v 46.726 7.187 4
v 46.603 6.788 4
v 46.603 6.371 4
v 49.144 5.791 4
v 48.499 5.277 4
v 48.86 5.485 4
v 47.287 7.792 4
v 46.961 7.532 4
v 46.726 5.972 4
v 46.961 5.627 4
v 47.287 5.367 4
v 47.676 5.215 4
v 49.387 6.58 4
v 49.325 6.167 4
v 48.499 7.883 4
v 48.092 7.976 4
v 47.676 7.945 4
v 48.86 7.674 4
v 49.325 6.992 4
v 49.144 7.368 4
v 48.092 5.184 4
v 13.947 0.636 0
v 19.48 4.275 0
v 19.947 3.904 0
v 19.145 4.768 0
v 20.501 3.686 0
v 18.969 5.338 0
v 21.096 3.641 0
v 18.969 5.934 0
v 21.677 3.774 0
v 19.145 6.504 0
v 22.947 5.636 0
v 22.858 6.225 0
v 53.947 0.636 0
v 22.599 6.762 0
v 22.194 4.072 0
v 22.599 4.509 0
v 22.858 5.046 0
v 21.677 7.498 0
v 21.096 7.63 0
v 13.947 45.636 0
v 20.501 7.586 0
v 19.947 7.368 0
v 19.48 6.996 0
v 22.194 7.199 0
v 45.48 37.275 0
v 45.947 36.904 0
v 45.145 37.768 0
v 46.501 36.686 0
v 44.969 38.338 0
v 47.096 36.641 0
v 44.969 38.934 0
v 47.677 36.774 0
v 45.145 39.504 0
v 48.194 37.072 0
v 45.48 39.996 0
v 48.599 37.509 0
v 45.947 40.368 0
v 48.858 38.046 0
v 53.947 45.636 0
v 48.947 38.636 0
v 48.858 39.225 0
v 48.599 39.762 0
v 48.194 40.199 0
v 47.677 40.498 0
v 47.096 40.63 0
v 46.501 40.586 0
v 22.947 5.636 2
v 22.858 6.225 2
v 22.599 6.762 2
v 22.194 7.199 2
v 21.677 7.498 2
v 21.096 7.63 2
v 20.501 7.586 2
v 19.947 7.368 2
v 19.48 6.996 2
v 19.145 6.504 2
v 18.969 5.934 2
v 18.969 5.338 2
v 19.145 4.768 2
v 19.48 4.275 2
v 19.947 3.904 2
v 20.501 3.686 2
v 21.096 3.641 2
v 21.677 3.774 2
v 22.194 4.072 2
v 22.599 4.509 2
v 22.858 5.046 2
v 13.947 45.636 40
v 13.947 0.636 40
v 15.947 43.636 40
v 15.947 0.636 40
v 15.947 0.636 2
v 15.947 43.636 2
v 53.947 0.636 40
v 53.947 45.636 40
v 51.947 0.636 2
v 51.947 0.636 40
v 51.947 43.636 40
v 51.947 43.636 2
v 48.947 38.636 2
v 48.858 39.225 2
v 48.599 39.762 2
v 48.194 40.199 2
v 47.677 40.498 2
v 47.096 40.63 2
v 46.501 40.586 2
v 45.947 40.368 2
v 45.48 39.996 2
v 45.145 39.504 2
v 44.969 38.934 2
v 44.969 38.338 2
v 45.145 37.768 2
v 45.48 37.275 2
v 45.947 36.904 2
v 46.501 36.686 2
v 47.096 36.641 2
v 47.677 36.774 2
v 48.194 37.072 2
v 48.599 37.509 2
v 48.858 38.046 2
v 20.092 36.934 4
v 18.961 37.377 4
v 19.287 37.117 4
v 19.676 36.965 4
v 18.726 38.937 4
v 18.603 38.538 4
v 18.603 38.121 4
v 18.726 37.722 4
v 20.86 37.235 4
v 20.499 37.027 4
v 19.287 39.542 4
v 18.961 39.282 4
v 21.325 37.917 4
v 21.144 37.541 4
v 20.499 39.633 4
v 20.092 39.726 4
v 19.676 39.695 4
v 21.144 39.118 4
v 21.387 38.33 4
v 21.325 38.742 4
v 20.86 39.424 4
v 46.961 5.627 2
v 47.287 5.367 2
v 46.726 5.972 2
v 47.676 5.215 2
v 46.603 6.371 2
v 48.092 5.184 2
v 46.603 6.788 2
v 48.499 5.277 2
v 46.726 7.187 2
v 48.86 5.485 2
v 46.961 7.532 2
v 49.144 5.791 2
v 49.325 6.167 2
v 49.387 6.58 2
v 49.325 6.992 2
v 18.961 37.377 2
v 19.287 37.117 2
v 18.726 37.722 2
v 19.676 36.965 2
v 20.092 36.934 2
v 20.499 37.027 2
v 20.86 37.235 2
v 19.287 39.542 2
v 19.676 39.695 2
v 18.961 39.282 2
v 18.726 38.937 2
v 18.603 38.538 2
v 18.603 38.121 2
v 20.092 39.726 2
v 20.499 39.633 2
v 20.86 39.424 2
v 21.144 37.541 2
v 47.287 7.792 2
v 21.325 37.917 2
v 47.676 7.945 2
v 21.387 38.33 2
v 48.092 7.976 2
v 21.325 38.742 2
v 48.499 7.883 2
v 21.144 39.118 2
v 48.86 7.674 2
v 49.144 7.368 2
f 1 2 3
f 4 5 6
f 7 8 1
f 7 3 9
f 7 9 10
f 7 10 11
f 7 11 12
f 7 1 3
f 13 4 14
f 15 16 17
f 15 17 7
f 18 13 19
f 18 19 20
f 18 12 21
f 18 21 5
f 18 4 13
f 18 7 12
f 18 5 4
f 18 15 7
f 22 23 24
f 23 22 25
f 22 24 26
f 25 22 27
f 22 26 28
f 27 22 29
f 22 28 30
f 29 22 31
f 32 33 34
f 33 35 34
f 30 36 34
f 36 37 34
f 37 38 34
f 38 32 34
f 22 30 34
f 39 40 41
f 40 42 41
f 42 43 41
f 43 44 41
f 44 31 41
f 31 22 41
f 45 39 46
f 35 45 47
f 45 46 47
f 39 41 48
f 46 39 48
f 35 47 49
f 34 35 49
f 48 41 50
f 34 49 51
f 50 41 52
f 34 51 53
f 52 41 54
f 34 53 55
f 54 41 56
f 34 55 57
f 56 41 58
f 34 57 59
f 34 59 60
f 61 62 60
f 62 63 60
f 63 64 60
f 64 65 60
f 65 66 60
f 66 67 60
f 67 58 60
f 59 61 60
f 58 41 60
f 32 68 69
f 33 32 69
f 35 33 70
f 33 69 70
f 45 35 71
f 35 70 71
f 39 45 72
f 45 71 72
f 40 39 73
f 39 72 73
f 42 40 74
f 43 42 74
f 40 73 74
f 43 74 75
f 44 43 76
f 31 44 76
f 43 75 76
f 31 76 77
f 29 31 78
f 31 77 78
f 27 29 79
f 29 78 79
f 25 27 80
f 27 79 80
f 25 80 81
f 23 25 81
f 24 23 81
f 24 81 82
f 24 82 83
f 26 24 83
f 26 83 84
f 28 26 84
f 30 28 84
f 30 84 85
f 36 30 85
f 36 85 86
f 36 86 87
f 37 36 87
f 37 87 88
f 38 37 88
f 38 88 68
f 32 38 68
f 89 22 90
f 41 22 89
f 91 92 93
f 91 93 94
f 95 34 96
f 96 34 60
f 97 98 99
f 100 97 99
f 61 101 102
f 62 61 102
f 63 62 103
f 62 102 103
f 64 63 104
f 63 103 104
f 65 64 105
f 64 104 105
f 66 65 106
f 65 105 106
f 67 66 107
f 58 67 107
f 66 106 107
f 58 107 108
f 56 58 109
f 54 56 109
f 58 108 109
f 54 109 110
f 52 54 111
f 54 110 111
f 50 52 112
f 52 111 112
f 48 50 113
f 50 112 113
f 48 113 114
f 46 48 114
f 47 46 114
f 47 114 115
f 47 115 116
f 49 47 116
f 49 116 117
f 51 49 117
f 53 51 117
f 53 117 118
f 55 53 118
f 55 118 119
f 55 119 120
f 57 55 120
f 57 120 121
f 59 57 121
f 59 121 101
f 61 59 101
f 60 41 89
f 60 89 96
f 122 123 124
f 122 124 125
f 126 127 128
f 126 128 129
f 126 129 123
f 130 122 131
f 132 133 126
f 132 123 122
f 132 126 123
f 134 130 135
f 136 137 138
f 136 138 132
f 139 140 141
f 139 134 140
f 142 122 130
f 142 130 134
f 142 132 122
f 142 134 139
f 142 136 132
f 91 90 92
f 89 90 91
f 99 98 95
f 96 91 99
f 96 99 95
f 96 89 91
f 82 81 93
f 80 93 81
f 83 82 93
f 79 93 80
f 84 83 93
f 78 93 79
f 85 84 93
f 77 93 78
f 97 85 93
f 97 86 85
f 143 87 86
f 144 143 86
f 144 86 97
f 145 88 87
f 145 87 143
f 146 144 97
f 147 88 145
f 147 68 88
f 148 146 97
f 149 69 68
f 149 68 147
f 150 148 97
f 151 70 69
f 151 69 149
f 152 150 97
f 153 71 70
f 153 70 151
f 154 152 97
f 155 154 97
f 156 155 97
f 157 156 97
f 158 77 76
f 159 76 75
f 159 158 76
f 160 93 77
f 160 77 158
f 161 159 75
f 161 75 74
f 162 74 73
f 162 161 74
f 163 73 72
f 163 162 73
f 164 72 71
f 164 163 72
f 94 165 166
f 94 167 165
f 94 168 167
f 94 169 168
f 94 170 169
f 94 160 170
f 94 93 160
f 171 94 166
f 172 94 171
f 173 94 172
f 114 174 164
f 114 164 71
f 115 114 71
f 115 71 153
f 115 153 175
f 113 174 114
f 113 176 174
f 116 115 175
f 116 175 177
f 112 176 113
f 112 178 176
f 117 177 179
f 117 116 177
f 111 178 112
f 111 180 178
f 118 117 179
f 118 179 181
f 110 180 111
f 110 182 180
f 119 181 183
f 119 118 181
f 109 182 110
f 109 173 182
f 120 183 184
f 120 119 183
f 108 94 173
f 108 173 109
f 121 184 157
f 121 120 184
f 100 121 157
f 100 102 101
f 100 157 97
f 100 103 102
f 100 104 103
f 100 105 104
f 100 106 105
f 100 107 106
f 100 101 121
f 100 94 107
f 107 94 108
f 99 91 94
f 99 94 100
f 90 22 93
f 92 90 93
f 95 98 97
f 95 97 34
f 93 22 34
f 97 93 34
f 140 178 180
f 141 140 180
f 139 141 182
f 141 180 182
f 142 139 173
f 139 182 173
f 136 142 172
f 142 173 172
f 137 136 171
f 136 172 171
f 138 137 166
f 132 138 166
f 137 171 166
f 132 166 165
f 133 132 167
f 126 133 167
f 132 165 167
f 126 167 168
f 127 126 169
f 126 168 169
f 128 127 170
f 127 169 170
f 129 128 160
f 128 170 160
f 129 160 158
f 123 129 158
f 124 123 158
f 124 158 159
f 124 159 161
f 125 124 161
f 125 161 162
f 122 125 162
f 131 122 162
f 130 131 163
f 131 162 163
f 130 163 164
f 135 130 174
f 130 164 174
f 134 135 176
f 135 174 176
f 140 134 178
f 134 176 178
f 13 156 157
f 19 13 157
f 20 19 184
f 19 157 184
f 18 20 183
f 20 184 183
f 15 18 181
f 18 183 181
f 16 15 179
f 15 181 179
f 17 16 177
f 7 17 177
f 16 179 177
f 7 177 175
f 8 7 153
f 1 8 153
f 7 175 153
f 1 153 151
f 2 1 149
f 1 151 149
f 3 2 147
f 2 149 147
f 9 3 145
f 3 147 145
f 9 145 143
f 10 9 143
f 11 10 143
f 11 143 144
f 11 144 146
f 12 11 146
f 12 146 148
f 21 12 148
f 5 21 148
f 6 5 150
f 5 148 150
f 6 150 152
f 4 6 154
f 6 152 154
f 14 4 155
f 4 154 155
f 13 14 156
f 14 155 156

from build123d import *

# Parameters (mm, degrees)
SKETCH_W        = 40
SKETCH_H        = 45
PAD_DEPTH       = 40
SKETCH001_W     = 36
SKETCH001_H     = 46.060933
POCKET_DEPTH    = 38
SKETCH002_R     = 1.4
PAD001_DEPTH    = 2
SKETCH003_R     = 2
POCKET001_DEPTH = 5


with BuildPart() as part:
    # Sketch → Pad (new body)
    with BuildSketch(Plane.XY):
        with Locations((33.946524, 23.135794)):
            Rectangle(SKETCH_W, SKETCH_H)
    extrude(amount=PAD_DEPTH)

    # Sketch001 → Pocket (cut)
    with BuildSketch(Plane.XY.offset(40)):
        with Locations((33.946524, 20.605327)):
            Rectangle(SKETCH001_W, SKETCH001_H)
    extrude(amount=-POCKET_DEPTH, mode=Mode.SUBTRACT)

    # Sketch002 → Pad001 (new body)
    with BuildSketch(Plane.XY.offset(2)):
        with Locations((19.987469, 38.329725)):
            Circle(SKETCH002_R)
        with Locations((47.987469, 6.579725)):
            Circle(SKETCH002_R)
    extrude(amount=PAD001_DEPTH)

    # Sketch003 → Pocket001 (cut)
    with BuildSketch(Plane.XY.offset(2)):
        with Locations((46.946524, 38.635794)):
            Circle(SKETCH003_R)
        with Locations((20.946524, 5.635794)):
            Circle(SKETCH003_R)
    extrude(amount=-POCKET001_DEPTH, mode=Mode.SUBTRACT)


solid = part.part
